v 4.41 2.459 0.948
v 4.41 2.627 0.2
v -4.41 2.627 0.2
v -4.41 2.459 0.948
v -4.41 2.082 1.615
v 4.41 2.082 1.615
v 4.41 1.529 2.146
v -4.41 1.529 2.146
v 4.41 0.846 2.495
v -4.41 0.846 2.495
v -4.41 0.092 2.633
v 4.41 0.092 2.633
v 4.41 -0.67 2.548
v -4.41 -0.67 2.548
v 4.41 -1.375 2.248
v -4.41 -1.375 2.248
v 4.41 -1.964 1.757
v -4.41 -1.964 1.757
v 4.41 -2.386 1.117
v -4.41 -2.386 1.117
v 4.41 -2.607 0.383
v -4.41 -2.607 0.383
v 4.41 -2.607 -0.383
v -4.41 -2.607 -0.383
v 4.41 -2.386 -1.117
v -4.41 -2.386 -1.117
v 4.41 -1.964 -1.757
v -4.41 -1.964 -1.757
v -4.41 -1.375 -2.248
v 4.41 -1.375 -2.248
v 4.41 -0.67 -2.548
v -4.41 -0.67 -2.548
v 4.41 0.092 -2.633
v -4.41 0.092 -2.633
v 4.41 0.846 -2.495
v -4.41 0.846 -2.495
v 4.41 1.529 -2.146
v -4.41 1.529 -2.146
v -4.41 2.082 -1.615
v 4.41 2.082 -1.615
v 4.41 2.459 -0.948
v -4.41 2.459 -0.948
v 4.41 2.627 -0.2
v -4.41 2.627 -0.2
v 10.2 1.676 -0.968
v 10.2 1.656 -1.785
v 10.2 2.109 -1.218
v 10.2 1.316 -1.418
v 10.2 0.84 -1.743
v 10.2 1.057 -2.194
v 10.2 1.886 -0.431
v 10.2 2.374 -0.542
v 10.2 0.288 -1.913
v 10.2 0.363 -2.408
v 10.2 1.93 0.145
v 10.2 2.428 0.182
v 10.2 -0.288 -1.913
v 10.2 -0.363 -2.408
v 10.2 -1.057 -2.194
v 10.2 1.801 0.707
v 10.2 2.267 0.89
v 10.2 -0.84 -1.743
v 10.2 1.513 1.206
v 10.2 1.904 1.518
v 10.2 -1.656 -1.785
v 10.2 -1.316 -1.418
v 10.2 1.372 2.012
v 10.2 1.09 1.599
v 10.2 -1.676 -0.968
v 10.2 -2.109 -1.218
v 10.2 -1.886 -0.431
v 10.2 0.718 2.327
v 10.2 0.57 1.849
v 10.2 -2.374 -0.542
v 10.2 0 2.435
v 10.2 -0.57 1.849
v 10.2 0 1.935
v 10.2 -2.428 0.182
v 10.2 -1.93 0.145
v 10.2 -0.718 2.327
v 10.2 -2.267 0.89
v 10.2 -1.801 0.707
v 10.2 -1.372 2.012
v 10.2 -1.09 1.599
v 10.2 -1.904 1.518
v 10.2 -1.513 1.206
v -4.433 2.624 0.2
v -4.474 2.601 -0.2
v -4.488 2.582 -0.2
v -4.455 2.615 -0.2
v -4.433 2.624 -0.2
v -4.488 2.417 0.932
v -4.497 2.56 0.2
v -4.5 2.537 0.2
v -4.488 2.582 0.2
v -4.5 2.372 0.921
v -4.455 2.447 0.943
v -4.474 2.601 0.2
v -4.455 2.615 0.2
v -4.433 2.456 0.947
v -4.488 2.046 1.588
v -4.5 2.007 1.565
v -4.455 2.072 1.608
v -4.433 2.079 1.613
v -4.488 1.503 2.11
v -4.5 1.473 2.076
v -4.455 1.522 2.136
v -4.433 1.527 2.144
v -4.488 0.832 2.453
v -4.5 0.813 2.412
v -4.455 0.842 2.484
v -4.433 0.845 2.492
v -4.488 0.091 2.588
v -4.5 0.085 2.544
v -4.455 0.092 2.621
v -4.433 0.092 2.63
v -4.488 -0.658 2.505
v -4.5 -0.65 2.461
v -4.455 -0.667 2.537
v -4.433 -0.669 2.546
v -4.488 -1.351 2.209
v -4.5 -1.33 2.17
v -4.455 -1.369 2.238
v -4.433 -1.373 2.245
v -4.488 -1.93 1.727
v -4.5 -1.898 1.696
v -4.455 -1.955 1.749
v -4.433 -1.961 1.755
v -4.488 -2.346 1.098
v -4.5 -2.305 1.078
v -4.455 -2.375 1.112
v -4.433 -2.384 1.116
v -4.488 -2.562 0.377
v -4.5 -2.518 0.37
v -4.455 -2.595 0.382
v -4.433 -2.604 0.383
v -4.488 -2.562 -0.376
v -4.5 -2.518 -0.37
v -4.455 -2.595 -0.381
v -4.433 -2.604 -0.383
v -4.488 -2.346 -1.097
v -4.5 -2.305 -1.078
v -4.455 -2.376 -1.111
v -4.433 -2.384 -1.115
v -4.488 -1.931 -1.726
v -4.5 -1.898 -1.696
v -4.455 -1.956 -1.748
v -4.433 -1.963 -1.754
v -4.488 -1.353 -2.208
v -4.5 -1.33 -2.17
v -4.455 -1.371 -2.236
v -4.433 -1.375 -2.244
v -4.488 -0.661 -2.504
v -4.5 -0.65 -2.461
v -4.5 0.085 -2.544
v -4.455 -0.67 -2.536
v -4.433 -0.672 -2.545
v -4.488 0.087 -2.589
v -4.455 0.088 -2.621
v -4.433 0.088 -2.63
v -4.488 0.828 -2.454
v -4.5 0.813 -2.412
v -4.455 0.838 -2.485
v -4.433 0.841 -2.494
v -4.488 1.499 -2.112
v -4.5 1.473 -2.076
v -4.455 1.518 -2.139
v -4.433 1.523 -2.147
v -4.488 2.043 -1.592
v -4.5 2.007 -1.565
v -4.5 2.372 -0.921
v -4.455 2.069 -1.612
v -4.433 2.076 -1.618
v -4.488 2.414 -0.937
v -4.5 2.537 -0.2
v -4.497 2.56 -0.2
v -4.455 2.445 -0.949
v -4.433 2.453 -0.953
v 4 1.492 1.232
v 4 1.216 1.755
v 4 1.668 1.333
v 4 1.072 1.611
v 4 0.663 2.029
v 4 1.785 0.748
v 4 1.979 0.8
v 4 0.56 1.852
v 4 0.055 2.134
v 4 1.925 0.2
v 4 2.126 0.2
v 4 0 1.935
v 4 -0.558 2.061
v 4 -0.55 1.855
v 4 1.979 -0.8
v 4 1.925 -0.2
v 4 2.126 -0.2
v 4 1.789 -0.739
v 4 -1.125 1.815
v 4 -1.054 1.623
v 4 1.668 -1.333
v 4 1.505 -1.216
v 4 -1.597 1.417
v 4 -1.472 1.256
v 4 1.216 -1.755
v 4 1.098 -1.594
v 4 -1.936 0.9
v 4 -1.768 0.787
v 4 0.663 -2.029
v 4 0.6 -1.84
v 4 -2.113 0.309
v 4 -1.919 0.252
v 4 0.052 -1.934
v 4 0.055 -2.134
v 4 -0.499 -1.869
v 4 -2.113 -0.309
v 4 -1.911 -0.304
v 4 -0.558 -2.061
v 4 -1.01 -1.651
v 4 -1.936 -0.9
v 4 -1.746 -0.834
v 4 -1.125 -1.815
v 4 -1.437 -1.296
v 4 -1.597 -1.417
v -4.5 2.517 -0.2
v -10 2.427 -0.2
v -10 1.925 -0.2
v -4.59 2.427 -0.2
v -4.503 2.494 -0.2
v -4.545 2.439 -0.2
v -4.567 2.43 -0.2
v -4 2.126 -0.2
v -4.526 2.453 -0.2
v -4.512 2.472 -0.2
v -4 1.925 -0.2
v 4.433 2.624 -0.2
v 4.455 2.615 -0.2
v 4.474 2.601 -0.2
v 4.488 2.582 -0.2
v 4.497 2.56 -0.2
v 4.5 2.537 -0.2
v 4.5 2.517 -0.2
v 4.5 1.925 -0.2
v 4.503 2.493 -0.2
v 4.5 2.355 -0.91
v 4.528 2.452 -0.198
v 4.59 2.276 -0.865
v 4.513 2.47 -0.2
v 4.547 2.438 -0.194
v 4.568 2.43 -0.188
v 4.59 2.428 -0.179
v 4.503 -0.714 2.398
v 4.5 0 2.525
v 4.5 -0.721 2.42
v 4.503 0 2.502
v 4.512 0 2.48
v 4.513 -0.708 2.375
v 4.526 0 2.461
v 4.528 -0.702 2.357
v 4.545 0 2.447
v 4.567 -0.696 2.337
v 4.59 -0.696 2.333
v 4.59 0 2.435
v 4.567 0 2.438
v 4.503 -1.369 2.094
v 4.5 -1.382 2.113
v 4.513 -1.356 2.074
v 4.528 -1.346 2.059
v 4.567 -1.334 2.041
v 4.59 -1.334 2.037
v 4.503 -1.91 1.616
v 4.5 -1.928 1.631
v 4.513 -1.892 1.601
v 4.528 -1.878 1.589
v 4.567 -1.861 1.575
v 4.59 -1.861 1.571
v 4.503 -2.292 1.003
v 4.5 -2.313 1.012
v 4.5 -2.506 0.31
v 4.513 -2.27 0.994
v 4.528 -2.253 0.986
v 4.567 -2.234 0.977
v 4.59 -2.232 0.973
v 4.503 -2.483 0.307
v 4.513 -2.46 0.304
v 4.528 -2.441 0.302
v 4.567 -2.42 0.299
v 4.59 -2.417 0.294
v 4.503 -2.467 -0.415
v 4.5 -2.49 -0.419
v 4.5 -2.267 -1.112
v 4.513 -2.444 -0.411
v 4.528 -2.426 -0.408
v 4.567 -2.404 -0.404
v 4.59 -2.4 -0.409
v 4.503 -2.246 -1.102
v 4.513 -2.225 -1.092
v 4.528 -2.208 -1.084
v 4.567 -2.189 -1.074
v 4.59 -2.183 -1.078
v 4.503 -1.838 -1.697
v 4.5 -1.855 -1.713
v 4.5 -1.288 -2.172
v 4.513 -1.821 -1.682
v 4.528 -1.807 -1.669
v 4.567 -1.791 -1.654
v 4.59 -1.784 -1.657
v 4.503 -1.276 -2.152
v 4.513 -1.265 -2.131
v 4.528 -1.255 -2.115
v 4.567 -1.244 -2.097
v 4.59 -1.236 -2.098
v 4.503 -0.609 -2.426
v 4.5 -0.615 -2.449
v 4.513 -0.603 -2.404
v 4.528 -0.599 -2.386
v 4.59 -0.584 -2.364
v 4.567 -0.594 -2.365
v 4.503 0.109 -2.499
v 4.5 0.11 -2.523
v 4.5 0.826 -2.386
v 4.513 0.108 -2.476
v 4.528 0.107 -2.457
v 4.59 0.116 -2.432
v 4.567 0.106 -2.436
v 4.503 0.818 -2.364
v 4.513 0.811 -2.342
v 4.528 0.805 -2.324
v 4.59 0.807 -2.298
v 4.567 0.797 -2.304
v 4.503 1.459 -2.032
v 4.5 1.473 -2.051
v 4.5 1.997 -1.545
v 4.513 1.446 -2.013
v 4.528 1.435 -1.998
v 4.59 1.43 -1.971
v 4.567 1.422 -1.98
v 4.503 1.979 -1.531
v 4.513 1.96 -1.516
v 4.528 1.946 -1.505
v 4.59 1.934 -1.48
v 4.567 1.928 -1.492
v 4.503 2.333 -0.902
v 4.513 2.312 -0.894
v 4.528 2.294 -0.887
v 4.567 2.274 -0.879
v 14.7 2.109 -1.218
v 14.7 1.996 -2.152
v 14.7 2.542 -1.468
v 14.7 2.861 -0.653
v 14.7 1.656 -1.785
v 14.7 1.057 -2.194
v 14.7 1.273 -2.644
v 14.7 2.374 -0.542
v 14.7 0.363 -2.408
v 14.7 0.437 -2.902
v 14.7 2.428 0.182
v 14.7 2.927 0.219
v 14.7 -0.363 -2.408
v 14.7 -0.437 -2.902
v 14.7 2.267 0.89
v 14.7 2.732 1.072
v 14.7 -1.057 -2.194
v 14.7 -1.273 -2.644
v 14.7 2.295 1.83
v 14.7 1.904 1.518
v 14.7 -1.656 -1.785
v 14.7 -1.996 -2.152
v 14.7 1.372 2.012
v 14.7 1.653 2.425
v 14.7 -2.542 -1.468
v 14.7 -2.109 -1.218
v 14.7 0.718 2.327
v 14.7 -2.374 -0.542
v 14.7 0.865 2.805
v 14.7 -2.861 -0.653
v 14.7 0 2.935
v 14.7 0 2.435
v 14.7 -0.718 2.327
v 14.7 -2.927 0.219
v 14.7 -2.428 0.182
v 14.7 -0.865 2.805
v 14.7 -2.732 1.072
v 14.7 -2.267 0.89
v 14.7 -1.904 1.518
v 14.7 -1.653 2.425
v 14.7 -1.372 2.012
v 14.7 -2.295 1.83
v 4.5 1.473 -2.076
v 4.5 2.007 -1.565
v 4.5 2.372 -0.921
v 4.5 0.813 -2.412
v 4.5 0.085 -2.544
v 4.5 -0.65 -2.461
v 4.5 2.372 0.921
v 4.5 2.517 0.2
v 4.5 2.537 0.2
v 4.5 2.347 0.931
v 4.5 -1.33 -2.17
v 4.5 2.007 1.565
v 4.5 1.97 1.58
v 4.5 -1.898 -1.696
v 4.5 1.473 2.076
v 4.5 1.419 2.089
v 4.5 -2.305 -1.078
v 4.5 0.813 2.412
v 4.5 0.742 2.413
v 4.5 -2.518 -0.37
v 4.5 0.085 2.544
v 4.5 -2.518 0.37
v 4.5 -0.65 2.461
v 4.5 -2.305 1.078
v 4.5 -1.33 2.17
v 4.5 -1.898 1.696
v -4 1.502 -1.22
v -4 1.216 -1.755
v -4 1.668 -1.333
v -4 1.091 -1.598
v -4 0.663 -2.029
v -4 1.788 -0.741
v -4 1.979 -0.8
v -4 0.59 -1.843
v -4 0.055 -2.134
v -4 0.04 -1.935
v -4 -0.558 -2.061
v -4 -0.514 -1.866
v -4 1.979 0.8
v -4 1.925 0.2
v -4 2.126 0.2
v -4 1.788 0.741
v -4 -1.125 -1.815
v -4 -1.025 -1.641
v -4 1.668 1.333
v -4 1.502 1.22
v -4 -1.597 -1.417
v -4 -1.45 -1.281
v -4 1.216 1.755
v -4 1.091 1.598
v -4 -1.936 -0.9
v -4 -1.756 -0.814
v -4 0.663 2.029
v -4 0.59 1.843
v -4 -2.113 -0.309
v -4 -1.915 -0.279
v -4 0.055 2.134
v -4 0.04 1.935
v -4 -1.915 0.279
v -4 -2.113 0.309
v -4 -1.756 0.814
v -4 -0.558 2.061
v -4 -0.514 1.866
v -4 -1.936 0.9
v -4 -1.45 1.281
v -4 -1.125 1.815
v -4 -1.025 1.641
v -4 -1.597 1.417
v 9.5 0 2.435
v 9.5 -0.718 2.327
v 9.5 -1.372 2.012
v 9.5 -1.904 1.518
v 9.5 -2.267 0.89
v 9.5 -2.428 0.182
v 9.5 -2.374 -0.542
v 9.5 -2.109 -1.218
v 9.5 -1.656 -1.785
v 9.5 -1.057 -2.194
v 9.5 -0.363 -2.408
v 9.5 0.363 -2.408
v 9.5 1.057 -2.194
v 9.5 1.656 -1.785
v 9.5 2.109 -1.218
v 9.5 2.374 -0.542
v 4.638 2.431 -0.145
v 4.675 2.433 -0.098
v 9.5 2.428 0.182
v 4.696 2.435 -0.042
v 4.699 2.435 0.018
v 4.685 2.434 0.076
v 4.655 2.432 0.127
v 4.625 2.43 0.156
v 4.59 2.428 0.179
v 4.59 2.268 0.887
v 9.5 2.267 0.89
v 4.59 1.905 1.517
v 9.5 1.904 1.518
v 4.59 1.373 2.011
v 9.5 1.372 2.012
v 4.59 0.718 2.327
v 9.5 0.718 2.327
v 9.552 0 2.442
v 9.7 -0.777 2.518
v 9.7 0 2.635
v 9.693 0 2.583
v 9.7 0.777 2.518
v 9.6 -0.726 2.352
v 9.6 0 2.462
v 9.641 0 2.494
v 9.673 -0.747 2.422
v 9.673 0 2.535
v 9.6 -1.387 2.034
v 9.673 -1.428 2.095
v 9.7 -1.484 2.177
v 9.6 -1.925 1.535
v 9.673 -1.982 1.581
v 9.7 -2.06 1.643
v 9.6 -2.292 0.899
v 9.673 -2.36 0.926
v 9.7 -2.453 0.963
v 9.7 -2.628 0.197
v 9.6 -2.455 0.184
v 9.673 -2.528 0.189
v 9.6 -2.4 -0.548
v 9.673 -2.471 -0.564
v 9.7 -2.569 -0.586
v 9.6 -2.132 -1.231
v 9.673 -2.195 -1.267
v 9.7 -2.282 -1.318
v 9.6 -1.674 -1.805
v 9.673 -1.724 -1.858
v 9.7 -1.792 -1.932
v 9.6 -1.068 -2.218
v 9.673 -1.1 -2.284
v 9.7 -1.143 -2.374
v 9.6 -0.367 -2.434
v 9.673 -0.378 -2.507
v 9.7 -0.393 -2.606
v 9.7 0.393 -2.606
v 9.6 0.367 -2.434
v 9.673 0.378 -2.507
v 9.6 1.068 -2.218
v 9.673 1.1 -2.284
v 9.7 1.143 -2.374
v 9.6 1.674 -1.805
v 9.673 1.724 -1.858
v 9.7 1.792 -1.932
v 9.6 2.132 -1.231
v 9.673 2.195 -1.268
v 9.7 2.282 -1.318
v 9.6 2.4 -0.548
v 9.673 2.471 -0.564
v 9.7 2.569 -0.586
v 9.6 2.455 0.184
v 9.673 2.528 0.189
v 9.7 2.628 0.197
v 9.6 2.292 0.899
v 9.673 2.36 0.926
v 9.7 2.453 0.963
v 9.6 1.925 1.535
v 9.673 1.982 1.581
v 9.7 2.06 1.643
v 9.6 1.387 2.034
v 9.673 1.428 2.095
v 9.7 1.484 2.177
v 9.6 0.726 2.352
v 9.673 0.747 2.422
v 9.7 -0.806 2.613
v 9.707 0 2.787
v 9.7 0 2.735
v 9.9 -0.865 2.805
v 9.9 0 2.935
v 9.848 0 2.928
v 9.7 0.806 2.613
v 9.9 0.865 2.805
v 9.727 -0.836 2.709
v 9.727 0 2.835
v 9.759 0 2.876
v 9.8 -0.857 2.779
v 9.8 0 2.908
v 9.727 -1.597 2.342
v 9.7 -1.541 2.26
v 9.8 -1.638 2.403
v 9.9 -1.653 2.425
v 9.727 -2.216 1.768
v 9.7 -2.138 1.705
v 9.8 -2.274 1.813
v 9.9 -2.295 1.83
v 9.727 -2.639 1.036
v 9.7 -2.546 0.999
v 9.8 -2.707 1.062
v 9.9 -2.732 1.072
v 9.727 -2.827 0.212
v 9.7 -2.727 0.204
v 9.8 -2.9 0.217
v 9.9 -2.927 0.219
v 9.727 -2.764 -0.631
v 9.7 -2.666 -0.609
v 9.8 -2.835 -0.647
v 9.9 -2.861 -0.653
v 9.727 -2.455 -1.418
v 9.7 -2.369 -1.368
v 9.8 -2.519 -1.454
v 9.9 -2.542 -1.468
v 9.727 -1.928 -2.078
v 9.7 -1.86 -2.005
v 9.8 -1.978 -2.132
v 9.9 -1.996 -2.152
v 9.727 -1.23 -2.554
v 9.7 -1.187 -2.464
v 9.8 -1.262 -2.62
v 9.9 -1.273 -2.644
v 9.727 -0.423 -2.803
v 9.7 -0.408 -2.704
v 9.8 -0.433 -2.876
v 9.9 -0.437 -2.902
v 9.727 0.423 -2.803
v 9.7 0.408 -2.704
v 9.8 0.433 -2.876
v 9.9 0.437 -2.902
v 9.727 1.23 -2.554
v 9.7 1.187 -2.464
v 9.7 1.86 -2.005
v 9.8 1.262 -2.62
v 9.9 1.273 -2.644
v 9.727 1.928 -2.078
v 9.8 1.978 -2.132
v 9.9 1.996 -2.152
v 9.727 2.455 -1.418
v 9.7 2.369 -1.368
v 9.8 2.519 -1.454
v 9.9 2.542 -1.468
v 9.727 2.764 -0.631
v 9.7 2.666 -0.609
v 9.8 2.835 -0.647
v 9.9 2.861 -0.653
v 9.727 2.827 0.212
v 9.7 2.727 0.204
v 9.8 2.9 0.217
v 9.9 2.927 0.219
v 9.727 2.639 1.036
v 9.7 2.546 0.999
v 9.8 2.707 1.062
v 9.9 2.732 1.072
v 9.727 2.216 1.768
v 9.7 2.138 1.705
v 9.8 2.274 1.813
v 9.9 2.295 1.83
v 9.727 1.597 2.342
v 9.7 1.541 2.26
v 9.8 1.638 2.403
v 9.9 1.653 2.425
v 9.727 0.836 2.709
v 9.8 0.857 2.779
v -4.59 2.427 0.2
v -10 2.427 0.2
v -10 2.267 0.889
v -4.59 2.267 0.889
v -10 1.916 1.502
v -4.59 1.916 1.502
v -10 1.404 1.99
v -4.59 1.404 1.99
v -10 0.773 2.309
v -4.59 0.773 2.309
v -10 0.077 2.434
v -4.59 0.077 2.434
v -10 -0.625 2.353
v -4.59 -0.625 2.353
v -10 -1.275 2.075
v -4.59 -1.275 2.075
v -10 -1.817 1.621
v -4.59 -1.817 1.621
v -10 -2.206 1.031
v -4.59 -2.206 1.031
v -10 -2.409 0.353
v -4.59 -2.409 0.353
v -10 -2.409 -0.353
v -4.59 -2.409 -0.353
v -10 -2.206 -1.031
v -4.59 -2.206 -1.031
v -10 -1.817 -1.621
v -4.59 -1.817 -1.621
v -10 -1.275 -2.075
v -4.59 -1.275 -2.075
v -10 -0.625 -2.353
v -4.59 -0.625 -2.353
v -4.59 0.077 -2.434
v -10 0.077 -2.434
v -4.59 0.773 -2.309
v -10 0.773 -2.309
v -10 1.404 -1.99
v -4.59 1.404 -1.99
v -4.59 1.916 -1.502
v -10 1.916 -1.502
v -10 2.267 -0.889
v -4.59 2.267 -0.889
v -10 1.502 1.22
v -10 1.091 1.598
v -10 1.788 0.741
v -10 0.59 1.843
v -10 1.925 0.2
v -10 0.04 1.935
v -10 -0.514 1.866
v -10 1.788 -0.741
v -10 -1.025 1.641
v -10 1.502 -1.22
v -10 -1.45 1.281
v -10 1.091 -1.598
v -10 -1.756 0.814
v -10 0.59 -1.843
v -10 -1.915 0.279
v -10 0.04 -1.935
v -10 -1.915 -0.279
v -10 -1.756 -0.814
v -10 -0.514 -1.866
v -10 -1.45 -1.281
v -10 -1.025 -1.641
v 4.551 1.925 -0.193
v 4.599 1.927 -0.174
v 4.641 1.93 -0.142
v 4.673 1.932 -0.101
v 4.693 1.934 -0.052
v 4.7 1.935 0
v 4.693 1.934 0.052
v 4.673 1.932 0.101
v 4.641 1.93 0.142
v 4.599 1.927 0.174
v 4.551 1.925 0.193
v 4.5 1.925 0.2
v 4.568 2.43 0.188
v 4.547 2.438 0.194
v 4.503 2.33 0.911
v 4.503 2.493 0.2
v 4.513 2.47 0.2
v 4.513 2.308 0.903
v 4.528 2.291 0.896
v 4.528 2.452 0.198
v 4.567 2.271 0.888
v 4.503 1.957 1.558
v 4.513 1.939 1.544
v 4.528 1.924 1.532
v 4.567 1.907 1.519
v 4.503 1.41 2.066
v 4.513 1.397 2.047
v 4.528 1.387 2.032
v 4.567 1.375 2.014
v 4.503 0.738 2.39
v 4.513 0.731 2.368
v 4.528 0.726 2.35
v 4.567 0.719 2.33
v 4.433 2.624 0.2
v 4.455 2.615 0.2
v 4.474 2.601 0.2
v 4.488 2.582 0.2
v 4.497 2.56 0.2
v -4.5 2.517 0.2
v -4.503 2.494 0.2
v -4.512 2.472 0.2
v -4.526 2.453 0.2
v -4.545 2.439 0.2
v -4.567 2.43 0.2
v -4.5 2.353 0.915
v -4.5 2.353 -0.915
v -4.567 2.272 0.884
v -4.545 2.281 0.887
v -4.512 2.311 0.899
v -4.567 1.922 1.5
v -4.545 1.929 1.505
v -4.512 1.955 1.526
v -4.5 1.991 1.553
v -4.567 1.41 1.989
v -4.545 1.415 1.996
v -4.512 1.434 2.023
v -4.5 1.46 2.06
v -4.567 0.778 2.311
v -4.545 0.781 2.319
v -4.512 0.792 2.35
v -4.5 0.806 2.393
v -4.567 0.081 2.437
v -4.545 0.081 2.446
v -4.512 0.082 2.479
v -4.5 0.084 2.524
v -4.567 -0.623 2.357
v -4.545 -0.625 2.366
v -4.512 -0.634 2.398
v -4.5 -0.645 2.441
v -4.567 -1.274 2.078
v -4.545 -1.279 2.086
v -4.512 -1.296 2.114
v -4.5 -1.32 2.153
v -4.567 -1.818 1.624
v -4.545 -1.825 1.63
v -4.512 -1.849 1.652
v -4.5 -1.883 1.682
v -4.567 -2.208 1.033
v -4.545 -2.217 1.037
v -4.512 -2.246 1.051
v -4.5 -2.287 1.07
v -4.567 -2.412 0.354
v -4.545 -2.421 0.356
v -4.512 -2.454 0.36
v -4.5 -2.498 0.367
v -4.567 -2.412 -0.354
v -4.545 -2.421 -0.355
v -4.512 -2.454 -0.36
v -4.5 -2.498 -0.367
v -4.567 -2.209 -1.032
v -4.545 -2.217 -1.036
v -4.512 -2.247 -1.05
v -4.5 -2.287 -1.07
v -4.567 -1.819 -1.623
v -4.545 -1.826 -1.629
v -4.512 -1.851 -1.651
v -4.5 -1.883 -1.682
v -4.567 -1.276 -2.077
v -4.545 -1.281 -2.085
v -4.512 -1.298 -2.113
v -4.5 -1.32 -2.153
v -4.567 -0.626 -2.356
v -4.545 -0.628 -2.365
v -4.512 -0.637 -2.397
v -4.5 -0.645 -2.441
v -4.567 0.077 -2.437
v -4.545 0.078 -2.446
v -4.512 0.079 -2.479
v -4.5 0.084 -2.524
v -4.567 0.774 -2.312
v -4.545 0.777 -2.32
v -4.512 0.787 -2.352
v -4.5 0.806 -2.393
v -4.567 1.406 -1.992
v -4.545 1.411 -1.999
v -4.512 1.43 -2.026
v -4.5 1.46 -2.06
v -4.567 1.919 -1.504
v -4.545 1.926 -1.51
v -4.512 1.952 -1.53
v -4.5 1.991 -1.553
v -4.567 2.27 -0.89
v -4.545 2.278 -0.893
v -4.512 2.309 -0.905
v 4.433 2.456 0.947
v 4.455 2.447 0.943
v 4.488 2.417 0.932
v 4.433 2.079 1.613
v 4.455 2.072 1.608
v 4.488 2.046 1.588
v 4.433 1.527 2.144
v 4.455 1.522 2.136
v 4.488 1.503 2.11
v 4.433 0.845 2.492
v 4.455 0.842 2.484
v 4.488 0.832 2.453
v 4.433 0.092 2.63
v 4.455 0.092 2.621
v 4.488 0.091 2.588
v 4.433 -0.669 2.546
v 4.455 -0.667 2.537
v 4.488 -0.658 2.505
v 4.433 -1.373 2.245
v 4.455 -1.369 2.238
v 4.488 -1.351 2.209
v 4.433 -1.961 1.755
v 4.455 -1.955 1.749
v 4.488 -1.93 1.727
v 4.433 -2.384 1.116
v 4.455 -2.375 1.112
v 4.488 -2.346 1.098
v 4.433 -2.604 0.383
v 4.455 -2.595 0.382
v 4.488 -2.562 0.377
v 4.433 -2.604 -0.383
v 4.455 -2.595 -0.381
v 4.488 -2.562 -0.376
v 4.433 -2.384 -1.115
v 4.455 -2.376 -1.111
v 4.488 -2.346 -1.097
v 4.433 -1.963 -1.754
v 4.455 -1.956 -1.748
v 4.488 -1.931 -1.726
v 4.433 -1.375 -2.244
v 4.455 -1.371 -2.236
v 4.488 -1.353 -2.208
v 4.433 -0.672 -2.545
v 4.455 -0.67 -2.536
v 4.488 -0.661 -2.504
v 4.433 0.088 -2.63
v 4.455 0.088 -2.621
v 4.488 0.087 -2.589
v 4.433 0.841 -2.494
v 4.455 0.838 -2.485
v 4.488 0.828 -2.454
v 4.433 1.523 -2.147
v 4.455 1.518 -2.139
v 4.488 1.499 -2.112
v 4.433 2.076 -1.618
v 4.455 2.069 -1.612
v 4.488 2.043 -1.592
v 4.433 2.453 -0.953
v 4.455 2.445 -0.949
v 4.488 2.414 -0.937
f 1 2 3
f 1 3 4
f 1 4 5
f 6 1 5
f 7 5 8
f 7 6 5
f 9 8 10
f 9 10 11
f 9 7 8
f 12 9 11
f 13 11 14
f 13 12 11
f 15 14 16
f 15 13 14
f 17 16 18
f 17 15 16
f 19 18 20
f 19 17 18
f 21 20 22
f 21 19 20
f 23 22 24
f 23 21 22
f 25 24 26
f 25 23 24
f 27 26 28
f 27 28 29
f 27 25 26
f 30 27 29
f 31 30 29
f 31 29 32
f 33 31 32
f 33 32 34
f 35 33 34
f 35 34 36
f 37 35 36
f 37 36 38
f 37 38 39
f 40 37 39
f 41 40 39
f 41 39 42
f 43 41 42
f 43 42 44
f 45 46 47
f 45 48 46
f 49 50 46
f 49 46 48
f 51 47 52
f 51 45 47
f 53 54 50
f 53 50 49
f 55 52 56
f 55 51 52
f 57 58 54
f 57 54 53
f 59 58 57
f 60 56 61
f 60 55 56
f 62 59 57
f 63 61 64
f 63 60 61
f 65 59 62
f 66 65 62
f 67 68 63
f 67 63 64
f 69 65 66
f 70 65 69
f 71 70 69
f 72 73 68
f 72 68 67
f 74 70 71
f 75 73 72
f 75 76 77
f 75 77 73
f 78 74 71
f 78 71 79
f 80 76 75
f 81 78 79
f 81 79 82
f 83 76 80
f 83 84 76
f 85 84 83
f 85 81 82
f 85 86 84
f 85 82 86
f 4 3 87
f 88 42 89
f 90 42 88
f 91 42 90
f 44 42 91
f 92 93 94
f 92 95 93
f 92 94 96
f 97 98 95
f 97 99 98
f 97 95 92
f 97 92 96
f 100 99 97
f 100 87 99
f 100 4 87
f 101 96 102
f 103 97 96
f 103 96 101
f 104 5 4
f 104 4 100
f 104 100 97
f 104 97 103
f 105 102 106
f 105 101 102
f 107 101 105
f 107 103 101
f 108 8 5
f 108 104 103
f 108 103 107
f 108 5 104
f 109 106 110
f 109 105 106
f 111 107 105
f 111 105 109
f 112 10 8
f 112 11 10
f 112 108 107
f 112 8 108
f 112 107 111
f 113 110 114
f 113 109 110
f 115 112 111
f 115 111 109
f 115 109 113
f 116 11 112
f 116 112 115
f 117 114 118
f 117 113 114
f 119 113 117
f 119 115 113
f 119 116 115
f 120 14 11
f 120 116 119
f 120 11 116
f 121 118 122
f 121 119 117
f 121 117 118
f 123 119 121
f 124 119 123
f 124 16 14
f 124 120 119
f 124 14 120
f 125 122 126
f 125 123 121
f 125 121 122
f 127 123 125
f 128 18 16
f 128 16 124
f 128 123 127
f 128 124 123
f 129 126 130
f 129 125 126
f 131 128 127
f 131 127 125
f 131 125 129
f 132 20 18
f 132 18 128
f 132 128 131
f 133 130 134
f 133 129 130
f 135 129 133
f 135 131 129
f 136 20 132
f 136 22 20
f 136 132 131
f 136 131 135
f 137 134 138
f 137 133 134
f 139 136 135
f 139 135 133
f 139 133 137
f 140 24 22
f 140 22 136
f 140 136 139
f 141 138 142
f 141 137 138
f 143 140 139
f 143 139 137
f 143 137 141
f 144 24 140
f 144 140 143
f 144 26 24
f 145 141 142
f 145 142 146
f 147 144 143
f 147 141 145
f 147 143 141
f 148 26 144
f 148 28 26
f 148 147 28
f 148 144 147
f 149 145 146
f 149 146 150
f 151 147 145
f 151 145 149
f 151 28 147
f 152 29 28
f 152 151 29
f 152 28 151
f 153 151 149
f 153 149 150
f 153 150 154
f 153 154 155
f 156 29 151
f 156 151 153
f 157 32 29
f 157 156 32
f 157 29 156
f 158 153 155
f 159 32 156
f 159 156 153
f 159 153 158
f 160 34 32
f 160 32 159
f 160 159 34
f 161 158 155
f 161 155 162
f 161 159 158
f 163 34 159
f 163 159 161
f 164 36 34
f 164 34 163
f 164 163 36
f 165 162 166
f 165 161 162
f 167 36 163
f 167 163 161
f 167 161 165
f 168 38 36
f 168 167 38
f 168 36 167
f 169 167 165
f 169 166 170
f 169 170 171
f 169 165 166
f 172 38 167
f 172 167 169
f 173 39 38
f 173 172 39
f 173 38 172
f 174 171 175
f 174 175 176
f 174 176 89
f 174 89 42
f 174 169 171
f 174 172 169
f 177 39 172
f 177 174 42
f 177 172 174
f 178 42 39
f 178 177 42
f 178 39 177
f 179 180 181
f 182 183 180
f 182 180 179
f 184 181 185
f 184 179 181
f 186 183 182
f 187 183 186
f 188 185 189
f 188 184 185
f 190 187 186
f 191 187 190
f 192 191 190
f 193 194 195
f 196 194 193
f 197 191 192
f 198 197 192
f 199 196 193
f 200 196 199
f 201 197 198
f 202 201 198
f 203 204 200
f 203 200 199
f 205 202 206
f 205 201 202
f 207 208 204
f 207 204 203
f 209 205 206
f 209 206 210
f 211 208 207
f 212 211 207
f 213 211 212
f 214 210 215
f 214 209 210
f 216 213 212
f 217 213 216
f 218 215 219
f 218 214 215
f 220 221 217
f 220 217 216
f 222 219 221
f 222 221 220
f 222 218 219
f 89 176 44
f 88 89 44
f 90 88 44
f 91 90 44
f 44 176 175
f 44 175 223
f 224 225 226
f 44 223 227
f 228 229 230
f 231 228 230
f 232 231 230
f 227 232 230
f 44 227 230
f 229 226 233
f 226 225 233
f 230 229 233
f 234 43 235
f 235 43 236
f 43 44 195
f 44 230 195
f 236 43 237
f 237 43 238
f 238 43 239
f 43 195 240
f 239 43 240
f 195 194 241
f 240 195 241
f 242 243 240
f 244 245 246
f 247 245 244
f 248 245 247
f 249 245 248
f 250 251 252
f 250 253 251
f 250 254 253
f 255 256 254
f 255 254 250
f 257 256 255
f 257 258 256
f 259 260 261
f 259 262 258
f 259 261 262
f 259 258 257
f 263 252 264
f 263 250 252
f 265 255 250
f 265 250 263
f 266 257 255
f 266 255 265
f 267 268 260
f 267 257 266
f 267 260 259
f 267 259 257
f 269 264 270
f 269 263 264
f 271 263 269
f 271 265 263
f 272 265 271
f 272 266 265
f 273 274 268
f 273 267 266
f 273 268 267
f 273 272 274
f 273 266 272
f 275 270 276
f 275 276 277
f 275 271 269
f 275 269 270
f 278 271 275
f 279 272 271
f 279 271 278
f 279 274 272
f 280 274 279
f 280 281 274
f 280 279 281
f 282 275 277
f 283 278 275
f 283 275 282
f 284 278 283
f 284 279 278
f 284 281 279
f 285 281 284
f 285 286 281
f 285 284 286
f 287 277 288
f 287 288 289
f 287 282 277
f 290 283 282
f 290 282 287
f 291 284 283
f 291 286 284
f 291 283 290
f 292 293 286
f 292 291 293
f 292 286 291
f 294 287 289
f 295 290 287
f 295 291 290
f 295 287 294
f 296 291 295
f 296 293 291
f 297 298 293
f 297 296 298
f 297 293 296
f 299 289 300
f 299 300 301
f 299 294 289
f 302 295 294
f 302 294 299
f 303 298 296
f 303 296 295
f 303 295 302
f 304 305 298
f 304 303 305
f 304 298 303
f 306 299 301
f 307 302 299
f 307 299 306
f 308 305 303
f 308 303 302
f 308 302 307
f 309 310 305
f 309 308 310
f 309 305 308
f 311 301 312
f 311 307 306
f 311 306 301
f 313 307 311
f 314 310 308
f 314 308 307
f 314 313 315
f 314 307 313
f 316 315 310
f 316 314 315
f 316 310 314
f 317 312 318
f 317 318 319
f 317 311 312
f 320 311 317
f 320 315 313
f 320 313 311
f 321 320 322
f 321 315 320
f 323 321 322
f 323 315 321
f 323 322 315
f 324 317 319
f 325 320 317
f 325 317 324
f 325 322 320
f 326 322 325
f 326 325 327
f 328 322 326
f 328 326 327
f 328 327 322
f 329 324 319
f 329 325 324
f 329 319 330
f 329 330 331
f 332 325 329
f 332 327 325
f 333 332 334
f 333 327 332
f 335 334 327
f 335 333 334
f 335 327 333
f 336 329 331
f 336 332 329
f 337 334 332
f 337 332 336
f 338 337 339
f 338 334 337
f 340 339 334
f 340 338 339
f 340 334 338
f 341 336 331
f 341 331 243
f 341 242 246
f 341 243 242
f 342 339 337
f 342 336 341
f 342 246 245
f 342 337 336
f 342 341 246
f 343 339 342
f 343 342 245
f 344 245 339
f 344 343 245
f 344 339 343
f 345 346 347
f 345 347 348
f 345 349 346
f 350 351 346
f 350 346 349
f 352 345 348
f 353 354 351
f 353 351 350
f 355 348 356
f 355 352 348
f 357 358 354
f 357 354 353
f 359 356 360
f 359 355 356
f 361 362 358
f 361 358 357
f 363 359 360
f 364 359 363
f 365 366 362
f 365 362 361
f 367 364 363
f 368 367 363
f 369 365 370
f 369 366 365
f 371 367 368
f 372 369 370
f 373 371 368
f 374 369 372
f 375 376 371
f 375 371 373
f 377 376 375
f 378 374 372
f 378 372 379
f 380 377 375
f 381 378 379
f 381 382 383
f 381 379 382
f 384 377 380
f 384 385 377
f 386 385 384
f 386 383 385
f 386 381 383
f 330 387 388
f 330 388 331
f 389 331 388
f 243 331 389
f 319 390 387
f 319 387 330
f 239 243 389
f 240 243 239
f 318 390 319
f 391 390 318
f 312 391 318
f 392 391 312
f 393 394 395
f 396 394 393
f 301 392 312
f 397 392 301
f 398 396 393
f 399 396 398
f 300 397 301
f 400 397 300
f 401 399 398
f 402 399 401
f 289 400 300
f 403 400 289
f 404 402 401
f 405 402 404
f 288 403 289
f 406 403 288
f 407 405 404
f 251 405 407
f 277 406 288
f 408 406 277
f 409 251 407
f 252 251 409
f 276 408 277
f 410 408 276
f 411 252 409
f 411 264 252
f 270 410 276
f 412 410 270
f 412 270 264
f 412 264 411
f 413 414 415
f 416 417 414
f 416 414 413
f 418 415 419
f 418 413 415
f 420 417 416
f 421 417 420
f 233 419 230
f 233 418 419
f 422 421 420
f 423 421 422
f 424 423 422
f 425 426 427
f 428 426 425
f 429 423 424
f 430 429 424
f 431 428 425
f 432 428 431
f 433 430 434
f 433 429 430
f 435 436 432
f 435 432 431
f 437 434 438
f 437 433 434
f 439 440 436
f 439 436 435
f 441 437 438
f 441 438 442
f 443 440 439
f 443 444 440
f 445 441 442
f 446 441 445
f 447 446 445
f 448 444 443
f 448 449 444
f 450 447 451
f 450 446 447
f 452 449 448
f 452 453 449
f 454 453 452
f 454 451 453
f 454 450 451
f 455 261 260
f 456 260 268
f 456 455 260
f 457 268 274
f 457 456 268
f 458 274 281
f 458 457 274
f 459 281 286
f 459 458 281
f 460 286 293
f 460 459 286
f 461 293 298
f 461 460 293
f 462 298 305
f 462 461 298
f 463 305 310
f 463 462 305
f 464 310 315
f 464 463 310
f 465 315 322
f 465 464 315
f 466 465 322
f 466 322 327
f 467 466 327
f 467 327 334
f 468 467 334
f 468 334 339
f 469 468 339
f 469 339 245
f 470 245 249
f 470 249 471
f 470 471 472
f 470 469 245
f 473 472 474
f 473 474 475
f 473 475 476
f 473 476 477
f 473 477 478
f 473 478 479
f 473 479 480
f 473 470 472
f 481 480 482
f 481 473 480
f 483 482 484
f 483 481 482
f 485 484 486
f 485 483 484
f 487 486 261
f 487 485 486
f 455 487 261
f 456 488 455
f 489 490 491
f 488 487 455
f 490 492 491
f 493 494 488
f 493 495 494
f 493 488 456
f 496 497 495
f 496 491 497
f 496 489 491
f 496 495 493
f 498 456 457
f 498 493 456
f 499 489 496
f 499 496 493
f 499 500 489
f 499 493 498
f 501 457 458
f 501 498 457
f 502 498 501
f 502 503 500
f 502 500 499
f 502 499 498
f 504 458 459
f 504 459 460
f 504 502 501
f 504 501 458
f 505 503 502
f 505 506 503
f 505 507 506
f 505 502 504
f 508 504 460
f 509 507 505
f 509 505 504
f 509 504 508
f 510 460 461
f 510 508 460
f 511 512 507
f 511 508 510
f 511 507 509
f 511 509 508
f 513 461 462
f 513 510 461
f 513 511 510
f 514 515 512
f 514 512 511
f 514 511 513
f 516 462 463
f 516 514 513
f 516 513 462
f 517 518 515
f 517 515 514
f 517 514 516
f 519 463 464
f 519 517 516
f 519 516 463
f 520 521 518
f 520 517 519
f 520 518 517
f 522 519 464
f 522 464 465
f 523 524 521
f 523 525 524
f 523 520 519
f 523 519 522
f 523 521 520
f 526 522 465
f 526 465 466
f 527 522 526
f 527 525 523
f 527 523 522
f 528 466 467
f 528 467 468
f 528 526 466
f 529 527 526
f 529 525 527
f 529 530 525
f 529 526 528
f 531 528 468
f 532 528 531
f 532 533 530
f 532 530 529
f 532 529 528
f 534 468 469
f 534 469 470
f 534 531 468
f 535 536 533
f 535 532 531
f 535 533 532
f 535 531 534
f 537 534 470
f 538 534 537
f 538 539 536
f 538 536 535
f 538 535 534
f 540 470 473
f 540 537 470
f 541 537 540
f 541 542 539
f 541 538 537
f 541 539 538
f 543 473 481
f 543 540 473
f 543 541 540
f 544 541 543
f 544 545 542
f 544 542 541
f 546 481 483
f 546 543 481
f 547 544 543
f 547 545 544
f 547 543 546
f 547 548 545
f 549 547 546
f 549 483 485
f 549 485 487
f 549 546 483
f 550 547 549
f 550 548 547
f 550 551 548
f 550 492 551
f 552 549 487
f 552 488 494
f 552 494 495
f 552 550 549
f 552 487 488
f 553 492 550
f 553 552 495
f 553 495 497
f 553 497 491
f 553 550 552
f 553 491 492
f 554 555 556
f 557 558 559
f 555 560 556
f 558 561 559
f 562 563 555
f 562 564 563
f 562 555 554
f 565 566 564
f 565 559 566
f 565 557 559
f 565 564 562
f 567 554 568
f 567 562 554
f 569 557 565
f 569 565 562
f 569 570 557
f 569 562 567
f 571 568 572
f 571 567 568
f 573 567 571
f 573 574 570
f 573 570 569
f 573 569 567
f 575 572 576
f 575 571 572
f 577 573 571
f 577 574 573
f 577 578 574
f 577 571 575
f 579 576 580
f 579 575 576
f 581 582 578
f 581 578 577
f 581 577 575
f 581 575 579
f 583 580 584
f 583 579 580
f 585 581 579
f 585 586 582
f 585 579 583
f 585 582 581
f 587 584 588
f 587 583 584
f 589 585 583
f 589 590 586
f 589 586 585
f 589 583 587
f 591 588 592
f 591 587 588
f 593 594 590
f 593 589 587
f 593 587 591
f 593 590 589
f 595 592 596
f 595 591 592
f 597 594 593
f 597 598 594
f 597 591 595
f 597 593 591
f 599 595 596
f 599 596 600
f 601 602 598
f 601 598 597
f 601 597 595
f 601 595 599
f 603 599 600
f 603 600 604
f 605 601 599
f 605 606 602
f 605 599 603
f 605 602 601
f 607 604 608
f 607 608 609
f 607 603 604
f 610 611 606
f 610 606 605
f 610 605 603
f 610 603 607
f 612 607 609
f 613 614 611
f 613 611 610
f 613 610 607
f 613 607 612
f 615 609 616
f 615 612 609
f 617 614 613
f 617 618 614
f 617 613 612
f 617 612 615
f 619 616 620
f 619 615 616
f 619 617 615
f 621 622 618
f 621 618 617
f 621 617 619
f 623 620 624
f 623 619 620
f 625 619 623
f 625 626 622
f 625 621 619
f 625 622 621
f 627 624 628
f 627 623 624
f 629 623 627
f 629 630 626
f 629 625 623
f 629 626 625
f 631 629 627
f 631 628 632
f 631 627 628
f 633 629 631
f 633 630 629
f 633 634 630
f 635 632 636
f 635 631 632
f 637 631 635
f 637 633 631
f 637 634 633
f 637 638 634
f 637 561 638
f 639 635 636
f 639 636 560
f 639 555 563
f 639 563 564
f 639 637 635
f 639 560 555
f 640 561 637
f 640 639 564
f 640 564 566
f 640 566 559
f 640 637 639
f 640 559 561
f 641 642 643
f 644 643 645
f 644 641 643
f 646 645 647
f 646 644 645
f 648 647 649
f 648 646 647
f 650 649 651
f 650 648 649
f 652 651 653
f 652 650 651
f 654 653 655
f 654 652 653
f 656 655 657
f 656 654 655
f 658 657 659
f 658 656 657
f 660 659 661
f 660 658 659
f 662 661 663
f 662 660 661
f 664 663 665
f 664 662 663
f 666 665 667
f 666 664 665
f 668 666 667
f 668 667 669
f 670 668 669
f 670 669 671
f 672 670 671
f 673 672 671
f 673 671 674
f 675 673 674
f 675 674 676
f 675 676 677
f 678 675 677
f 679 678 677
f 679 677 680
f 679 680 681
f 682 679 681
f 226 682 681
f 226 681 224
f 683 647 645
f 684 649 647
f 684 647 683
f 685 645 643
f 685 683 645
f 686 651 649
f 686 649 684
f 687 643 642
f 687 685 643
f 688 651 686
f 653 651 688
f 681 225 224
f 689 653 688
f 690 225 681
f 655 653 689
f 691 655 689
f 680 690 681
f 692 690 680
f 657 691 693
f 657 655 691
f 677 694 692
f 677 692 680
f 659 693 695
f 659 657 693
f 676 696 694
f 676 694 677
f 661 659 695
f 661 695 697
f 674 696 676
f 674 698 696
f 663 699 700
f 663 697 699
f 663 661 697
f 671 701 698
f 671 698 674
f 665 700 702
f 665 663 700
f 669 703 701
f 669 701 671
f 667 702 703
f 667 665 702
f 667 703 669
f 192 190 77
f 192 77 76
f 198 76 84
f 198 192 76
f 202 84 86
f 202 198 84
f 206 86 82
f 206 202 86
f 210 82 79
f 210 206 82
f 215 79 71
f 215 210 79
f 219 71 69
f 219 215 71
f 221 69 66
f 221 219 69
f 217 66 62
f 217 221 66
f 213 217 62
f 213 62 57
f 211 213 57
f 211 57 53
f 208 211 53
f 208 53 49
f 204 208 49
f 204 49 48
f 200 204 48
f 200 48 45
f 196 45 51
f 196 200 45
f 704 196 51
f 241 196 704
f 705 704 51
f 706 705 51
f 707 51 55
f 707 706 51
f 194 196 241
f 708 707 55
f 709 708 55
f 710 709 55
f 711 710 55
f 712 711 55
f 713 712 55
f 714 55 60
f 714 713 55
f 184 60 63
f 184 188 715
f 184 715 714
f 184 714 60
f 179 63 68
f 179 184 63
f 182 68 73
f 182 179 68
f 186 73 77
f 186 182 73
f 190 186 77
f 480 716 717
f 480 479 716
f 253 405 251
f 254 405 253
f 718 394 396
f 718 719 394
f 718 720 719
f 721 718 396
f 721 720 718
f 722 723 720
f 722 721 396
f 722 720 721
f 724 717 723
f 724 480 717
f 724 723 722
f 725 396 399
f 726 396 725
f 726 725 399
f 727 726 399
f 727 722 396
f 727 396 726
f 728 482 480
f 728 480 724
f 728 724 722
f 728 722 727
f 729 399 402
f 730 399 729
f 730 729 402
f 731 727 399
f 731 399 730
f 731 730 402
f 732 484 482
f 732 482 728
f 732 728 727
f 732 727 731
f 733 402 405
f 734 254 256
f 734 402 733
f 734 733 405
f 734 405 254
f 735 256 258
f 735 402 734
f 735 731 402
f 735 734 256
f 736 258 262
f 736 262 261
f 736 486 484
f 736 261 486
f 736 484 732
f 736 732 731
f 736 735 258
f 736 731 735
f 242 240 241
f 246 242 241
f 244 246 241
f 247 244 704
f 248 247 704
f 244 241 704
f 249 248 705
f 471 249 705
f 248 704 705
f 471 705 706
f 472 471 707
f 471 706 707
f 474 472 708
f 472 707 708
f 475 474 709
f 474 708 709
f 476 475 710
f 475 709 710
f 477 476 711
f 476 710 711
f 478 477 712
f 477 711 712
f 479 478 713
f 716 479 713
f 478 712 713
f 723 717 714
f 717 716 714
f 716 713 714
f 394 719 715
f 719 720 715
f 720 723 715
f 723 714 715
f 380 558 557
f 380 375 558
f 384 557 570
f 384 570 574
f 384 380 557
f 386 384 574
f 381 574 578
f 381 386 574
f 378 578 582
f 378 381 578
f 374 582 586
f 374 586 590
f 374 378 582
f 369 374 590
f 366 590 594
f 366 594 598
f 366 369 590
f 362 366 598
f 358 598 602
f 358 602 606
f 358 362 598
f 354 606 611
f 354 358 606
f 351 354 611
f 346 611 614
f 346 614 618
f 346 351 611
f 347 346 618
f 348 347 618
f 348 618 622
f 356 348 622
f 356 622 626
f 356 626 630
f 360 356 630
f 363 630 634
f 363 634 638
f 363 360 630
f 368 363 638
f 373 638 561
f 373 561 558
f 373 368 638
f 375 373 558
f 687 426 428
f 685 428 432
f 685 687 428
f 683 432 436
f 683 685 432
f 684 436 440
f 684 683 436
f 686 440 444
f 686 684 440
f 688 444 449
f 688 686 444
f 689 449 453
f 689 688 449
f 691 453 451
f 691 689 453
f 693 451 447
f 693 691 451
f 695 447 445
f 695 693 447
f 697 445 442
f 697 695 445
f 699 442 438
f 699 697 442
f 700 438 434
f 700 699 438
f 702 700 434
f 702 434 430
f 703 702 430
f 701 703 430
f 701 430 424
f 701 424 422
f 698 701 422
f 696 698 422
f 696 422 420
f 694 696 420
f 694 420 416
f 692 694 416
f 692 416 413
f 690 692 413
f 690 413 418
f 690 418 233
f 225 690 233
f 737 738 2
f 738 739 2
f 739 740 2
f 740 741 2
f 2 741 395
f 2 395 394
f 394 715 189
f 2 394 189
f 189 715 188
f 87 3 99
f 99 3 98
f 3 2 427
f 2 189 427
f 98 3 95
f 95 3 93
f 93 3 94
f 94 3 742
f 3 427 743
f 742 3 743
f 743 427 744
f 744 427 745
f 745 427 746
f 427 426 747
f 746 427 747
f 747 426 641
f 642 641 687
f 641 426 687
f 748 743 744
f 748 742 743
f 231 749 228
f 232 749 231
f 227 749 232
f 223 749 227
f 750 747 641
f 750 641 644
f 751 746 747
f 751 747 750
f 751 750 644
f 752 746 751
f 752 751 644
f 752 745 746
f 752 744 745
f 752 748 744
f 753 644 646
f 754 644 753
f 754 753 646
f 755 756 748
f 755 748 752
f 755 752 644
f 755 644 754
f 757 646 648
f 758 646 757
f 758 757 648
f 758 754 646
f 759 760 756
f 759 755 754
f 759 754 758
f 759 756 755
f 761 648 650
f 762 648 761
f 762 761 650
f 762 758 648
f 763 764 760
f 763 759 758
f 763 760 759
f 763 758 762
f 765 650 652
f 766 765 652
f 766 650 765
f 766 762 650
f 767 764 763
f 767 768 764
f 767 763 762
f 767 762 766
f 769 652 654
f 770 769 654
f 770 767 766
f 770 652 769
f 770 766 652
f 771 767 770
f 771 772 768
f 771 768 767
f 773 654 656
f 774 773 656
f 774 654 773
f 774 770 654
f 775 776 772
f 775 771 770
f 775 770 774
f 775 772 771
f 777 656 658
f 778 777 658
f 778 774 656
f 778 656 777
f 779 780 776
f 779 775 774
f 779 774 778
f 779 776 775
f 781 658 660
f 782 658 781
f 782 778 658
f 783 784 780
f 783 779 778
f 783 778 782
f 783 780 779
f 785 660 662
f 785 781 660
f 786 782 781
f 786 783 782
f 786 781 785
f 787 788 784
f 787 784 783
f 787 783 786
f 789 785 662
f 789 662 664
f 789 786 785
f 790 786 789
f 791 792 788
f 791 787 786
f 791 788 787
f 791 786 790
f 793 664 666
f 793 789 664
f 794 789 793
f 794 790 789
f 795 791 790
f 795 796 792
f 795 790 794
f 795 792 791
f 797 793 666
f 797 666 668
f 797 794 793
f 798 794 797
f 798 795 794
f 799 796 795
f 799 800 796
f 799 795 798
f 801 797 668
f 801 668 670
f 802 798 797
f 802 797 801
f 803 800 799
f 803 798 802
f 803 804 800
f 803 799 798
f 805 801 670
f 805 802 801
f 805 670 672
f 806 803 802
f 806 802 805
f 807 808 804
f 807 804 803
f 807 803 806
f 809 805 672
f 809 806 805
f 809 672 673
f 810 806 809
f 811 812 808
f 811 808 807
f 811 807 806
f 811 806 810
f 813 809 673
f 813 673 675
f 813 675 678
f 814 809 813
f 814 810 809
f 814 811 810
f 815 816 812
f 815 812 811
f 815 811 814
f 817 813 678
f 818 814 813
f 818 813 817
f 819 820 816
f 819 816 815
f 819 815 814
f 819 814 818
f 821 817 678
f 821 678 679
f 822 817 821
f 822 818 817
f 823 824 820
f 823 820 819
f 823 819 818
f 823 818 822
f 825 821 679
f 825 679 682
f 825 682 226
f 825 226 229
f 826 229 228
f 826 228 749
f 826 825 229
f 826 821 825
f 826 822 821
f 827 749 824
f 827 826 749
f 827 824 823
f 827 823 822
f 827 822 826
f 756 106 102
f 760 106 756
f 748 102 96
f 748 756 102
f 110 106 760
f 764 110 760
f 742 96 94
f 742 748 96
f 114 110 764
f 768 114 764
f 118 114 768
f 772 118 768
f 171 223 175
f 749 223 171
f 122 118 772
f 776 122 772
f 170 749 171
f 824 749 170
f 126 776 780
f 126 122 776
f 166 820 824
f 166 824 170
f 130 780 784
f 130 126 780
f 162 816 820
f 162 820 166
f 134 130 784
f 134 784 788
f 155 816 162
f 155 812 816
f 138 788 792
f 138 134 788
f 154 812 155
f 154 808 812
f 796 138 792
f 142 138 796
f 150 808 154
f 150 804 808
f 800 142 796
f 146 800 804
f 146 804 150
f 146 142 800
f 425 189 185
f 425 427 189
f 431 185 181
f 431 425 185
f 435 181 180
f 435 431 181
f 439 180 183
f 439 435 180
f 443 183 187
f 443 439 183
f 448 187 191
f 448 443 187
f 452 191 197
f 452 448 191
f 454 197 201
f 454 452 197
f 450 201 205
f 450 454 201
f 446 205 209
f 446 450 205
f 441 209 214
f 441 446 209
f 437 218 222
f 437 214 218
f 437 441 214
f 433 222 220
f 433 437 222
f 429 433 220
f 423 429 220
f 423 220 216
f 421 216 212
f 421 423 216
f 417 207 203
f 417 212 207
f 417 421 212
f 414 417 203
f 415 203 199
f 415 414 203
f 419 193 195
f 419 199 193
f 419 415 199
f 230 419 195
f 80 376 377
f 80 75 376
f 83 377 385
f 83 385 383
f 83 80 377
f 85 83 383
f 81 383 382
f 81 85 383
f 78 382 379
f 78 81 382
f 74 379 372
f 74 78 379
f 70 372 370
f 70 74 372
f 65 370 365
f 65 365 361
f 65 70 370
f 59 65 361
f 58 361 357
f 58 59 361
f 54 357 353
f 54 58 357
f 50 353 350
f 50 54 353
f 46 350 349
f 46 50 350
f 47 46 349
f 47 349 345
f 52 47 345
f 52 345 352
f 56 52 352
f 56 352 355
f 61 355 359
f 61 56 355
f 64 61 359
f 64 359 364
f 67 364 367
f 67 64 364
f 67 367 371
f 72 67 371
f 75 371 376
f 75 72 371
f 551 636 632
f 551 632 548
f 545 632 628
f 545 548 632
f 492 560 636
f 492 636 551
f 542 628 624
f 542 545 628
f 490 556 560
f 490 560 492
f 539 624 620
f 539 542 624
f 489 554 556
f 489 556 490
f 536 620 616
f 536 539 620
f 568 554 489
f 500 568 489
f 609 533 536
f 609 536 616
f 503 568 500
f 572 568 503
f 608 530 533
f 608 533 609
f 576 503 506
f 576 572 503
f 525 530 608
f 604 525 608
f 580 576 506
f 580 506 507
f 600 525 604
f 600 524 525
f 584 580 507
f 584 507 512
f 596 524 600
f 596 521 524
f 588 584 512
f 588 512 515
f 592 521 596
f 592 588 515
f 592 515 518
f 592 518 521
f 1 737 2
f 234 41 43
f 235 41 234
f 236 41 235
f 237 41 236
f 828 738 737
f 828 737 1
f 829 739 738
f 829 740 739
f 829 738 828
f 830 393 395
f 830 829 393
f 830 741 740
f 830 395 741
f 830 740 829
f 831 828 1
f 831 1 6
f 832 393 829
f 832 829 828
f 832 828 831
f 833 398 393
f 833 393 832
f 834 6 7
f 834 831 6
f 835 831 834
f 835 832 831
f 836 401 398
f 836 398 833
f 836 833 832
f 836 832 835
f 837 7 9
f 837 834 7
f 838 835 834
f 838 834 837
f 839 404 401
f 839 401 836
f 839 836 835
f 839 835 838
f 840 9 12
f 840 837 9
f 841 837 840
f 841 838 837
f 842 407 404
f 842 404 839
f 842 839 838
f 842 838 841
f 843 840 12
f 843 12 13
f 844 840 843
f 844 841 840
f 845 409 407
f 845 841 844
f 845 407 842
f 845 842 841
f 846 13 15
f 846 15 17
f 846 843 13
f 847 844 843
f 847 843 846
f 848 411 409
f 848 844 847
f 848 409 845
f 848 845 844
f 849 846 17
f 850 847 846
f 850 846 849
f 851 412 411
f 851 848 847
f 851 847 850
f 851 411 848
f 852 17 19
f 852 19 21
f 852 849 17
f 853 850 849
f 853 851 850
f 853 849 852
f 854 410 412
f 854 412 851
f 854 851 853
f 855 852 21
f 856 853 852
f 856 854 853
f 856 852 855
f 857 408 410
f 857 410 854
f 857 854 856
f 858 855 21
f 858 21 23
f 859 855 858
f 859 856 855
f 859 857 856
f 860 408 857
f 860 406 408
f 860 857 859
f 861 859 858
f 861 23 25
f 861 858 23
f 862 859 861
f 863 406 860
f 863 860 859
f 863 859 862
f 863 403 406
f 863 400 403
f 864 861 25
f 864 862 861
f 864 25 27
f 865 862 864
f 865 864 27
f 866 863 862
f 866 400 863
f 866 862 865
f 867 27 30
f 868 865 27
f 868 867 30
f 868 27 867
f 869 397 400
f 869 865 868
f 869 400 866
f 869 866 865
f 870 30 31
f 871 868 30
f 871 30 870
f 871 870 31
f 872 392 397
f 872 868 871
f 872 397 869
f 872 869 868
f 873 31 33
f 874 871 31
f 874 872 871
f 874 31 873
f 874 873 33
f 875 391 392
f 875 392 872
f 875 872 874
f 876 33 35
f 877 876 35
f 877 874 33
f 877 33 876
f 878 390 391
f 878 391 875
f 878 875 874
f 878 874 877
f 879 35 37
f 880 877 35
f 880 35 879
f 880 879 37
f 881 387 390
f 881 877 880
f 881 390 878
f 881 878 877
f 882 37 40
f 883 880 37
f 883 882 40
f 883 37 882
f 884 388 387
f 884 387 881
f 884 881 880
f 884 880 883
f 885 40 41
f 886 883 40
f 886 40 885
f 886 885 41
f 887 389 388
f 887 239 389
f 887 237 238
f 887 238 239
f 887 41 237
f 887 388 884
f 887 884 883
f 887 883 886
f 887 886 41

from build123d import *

# Parameters (mm, degrees)
CUT_EXTRUDE2_DEPTH = 16.27476517574002


with BuildPart() as part:
    # Sketch1 → Revolve1 (revolve)
    with BuildSketch(Plane(origin=(0, 0, 0), x_dir=(1, 0, 0), z_dir=(0, 1, 0)), mode=Mode.PRIVATE) as revolve1_sk:
        with BuildLine():
            Line((14.7, 2.4350000000000023), (10.2, 2.4350000000000014))
            Line((10.2, 2.4350000000000014), (10.2, 1.935))
            Line((10.2, 1.935), (4, 1.935))
            Line((4, 1.935), (4, 2.135))
            Line((4, 2.135), (-4, 2.135))
            Line((-4, 2.135), (-4, 1.935))
            Line((-4, 1.935), (-10, 1.9350000000000027))
            Line((-10, 1.9350000000000027), (-10, 2.435))
            Line((-10, 2.435), (-4.590000000000002, 2.435))
            ThreePointArc((-4.590000000000002, 2.435), (-4.526360389693211, 2.4613603896932106), (-4.500000000000001, 2.525000000000001))
            Line((-4.500000000000001, 2.525000000000001), (-4.500000000000001, 2.544999999999999))
            ThreePointArc((-4.500000000000001, 2.544999999999999), (-4.47363961030679, 2.6086396103067893), (-4.41, 2.635))
            Line((-4.41, 2.635), (4.41, 2.635))
            ThreePointArc((4.41, 2.635), (4.47363961030679, 2.6086396103067893), (4.500000000000001, 2.544999999999999))
            Line((4.500000000000001, 2.544999999999999), (4.500000000000001, 2.525000000000001))
            ThreePointArc((4.500000000000001, 2.525000000000001), (4.526360389693211, 2.4613603896932106), (4.590000000000002, 2.435))
            Line((4.590000000000002, 2.435), (9.499999999999996, 2.435))
            ThreePointArc((9.499999999999996, 2.435), (9.64142135623731, 2.4935786437626897), (9.7, 2.6350000000000016))
            Line((9.7, 2.6350000000000016), (9.7, 2.7350000000000008))
            ThreePointArc((9.7, 2.7350000000000008), (9.75857864376269, 2.8764213562373118), (9.9, 2.9350000000000023))
            Line((9.9, 2.9350000000000023), (14.7, 2.9350000000000023))
            Line((14.7, 2.9350000000000023), (14.7, 2.4350000000000023))
        make_face()
    revolve(revolve1_sk.sketch.rotate(Axis((-16.2, 0, 0), (1, 0, 0)), 180), axis=Axis((-16.2, 0, 0), (1, 0, 0)))

    # Sketch3 → Cut-Extrude2 (cut, through all)
    with BuildSketch(Plane(origin=(0, 0, 0), x_dir=(1, 0, 0), z_dir=(0, 1, 0))):
        with BuildLine():
            Line((-10, 0.20000000000000012), (4.500000000000001, 0.19999999999999996))
            ThreePointArc((4.500000000000001, 0.19999999999999996), (4.700000000000001, -5e-17), (4.500000000000001, -0.20000000000000007))
            Line((4.500000000000001, -0.20000000000000007), (-10, -0.20000000000000007))
            Line((-10, -0.20000000000000007), (-10, 0.20000000000000012))
        make_face()
    extrude(amount=CUT_EXTRUDE2_DEPTH, mode=Mode.SUBTRACT)


solid = part.part
